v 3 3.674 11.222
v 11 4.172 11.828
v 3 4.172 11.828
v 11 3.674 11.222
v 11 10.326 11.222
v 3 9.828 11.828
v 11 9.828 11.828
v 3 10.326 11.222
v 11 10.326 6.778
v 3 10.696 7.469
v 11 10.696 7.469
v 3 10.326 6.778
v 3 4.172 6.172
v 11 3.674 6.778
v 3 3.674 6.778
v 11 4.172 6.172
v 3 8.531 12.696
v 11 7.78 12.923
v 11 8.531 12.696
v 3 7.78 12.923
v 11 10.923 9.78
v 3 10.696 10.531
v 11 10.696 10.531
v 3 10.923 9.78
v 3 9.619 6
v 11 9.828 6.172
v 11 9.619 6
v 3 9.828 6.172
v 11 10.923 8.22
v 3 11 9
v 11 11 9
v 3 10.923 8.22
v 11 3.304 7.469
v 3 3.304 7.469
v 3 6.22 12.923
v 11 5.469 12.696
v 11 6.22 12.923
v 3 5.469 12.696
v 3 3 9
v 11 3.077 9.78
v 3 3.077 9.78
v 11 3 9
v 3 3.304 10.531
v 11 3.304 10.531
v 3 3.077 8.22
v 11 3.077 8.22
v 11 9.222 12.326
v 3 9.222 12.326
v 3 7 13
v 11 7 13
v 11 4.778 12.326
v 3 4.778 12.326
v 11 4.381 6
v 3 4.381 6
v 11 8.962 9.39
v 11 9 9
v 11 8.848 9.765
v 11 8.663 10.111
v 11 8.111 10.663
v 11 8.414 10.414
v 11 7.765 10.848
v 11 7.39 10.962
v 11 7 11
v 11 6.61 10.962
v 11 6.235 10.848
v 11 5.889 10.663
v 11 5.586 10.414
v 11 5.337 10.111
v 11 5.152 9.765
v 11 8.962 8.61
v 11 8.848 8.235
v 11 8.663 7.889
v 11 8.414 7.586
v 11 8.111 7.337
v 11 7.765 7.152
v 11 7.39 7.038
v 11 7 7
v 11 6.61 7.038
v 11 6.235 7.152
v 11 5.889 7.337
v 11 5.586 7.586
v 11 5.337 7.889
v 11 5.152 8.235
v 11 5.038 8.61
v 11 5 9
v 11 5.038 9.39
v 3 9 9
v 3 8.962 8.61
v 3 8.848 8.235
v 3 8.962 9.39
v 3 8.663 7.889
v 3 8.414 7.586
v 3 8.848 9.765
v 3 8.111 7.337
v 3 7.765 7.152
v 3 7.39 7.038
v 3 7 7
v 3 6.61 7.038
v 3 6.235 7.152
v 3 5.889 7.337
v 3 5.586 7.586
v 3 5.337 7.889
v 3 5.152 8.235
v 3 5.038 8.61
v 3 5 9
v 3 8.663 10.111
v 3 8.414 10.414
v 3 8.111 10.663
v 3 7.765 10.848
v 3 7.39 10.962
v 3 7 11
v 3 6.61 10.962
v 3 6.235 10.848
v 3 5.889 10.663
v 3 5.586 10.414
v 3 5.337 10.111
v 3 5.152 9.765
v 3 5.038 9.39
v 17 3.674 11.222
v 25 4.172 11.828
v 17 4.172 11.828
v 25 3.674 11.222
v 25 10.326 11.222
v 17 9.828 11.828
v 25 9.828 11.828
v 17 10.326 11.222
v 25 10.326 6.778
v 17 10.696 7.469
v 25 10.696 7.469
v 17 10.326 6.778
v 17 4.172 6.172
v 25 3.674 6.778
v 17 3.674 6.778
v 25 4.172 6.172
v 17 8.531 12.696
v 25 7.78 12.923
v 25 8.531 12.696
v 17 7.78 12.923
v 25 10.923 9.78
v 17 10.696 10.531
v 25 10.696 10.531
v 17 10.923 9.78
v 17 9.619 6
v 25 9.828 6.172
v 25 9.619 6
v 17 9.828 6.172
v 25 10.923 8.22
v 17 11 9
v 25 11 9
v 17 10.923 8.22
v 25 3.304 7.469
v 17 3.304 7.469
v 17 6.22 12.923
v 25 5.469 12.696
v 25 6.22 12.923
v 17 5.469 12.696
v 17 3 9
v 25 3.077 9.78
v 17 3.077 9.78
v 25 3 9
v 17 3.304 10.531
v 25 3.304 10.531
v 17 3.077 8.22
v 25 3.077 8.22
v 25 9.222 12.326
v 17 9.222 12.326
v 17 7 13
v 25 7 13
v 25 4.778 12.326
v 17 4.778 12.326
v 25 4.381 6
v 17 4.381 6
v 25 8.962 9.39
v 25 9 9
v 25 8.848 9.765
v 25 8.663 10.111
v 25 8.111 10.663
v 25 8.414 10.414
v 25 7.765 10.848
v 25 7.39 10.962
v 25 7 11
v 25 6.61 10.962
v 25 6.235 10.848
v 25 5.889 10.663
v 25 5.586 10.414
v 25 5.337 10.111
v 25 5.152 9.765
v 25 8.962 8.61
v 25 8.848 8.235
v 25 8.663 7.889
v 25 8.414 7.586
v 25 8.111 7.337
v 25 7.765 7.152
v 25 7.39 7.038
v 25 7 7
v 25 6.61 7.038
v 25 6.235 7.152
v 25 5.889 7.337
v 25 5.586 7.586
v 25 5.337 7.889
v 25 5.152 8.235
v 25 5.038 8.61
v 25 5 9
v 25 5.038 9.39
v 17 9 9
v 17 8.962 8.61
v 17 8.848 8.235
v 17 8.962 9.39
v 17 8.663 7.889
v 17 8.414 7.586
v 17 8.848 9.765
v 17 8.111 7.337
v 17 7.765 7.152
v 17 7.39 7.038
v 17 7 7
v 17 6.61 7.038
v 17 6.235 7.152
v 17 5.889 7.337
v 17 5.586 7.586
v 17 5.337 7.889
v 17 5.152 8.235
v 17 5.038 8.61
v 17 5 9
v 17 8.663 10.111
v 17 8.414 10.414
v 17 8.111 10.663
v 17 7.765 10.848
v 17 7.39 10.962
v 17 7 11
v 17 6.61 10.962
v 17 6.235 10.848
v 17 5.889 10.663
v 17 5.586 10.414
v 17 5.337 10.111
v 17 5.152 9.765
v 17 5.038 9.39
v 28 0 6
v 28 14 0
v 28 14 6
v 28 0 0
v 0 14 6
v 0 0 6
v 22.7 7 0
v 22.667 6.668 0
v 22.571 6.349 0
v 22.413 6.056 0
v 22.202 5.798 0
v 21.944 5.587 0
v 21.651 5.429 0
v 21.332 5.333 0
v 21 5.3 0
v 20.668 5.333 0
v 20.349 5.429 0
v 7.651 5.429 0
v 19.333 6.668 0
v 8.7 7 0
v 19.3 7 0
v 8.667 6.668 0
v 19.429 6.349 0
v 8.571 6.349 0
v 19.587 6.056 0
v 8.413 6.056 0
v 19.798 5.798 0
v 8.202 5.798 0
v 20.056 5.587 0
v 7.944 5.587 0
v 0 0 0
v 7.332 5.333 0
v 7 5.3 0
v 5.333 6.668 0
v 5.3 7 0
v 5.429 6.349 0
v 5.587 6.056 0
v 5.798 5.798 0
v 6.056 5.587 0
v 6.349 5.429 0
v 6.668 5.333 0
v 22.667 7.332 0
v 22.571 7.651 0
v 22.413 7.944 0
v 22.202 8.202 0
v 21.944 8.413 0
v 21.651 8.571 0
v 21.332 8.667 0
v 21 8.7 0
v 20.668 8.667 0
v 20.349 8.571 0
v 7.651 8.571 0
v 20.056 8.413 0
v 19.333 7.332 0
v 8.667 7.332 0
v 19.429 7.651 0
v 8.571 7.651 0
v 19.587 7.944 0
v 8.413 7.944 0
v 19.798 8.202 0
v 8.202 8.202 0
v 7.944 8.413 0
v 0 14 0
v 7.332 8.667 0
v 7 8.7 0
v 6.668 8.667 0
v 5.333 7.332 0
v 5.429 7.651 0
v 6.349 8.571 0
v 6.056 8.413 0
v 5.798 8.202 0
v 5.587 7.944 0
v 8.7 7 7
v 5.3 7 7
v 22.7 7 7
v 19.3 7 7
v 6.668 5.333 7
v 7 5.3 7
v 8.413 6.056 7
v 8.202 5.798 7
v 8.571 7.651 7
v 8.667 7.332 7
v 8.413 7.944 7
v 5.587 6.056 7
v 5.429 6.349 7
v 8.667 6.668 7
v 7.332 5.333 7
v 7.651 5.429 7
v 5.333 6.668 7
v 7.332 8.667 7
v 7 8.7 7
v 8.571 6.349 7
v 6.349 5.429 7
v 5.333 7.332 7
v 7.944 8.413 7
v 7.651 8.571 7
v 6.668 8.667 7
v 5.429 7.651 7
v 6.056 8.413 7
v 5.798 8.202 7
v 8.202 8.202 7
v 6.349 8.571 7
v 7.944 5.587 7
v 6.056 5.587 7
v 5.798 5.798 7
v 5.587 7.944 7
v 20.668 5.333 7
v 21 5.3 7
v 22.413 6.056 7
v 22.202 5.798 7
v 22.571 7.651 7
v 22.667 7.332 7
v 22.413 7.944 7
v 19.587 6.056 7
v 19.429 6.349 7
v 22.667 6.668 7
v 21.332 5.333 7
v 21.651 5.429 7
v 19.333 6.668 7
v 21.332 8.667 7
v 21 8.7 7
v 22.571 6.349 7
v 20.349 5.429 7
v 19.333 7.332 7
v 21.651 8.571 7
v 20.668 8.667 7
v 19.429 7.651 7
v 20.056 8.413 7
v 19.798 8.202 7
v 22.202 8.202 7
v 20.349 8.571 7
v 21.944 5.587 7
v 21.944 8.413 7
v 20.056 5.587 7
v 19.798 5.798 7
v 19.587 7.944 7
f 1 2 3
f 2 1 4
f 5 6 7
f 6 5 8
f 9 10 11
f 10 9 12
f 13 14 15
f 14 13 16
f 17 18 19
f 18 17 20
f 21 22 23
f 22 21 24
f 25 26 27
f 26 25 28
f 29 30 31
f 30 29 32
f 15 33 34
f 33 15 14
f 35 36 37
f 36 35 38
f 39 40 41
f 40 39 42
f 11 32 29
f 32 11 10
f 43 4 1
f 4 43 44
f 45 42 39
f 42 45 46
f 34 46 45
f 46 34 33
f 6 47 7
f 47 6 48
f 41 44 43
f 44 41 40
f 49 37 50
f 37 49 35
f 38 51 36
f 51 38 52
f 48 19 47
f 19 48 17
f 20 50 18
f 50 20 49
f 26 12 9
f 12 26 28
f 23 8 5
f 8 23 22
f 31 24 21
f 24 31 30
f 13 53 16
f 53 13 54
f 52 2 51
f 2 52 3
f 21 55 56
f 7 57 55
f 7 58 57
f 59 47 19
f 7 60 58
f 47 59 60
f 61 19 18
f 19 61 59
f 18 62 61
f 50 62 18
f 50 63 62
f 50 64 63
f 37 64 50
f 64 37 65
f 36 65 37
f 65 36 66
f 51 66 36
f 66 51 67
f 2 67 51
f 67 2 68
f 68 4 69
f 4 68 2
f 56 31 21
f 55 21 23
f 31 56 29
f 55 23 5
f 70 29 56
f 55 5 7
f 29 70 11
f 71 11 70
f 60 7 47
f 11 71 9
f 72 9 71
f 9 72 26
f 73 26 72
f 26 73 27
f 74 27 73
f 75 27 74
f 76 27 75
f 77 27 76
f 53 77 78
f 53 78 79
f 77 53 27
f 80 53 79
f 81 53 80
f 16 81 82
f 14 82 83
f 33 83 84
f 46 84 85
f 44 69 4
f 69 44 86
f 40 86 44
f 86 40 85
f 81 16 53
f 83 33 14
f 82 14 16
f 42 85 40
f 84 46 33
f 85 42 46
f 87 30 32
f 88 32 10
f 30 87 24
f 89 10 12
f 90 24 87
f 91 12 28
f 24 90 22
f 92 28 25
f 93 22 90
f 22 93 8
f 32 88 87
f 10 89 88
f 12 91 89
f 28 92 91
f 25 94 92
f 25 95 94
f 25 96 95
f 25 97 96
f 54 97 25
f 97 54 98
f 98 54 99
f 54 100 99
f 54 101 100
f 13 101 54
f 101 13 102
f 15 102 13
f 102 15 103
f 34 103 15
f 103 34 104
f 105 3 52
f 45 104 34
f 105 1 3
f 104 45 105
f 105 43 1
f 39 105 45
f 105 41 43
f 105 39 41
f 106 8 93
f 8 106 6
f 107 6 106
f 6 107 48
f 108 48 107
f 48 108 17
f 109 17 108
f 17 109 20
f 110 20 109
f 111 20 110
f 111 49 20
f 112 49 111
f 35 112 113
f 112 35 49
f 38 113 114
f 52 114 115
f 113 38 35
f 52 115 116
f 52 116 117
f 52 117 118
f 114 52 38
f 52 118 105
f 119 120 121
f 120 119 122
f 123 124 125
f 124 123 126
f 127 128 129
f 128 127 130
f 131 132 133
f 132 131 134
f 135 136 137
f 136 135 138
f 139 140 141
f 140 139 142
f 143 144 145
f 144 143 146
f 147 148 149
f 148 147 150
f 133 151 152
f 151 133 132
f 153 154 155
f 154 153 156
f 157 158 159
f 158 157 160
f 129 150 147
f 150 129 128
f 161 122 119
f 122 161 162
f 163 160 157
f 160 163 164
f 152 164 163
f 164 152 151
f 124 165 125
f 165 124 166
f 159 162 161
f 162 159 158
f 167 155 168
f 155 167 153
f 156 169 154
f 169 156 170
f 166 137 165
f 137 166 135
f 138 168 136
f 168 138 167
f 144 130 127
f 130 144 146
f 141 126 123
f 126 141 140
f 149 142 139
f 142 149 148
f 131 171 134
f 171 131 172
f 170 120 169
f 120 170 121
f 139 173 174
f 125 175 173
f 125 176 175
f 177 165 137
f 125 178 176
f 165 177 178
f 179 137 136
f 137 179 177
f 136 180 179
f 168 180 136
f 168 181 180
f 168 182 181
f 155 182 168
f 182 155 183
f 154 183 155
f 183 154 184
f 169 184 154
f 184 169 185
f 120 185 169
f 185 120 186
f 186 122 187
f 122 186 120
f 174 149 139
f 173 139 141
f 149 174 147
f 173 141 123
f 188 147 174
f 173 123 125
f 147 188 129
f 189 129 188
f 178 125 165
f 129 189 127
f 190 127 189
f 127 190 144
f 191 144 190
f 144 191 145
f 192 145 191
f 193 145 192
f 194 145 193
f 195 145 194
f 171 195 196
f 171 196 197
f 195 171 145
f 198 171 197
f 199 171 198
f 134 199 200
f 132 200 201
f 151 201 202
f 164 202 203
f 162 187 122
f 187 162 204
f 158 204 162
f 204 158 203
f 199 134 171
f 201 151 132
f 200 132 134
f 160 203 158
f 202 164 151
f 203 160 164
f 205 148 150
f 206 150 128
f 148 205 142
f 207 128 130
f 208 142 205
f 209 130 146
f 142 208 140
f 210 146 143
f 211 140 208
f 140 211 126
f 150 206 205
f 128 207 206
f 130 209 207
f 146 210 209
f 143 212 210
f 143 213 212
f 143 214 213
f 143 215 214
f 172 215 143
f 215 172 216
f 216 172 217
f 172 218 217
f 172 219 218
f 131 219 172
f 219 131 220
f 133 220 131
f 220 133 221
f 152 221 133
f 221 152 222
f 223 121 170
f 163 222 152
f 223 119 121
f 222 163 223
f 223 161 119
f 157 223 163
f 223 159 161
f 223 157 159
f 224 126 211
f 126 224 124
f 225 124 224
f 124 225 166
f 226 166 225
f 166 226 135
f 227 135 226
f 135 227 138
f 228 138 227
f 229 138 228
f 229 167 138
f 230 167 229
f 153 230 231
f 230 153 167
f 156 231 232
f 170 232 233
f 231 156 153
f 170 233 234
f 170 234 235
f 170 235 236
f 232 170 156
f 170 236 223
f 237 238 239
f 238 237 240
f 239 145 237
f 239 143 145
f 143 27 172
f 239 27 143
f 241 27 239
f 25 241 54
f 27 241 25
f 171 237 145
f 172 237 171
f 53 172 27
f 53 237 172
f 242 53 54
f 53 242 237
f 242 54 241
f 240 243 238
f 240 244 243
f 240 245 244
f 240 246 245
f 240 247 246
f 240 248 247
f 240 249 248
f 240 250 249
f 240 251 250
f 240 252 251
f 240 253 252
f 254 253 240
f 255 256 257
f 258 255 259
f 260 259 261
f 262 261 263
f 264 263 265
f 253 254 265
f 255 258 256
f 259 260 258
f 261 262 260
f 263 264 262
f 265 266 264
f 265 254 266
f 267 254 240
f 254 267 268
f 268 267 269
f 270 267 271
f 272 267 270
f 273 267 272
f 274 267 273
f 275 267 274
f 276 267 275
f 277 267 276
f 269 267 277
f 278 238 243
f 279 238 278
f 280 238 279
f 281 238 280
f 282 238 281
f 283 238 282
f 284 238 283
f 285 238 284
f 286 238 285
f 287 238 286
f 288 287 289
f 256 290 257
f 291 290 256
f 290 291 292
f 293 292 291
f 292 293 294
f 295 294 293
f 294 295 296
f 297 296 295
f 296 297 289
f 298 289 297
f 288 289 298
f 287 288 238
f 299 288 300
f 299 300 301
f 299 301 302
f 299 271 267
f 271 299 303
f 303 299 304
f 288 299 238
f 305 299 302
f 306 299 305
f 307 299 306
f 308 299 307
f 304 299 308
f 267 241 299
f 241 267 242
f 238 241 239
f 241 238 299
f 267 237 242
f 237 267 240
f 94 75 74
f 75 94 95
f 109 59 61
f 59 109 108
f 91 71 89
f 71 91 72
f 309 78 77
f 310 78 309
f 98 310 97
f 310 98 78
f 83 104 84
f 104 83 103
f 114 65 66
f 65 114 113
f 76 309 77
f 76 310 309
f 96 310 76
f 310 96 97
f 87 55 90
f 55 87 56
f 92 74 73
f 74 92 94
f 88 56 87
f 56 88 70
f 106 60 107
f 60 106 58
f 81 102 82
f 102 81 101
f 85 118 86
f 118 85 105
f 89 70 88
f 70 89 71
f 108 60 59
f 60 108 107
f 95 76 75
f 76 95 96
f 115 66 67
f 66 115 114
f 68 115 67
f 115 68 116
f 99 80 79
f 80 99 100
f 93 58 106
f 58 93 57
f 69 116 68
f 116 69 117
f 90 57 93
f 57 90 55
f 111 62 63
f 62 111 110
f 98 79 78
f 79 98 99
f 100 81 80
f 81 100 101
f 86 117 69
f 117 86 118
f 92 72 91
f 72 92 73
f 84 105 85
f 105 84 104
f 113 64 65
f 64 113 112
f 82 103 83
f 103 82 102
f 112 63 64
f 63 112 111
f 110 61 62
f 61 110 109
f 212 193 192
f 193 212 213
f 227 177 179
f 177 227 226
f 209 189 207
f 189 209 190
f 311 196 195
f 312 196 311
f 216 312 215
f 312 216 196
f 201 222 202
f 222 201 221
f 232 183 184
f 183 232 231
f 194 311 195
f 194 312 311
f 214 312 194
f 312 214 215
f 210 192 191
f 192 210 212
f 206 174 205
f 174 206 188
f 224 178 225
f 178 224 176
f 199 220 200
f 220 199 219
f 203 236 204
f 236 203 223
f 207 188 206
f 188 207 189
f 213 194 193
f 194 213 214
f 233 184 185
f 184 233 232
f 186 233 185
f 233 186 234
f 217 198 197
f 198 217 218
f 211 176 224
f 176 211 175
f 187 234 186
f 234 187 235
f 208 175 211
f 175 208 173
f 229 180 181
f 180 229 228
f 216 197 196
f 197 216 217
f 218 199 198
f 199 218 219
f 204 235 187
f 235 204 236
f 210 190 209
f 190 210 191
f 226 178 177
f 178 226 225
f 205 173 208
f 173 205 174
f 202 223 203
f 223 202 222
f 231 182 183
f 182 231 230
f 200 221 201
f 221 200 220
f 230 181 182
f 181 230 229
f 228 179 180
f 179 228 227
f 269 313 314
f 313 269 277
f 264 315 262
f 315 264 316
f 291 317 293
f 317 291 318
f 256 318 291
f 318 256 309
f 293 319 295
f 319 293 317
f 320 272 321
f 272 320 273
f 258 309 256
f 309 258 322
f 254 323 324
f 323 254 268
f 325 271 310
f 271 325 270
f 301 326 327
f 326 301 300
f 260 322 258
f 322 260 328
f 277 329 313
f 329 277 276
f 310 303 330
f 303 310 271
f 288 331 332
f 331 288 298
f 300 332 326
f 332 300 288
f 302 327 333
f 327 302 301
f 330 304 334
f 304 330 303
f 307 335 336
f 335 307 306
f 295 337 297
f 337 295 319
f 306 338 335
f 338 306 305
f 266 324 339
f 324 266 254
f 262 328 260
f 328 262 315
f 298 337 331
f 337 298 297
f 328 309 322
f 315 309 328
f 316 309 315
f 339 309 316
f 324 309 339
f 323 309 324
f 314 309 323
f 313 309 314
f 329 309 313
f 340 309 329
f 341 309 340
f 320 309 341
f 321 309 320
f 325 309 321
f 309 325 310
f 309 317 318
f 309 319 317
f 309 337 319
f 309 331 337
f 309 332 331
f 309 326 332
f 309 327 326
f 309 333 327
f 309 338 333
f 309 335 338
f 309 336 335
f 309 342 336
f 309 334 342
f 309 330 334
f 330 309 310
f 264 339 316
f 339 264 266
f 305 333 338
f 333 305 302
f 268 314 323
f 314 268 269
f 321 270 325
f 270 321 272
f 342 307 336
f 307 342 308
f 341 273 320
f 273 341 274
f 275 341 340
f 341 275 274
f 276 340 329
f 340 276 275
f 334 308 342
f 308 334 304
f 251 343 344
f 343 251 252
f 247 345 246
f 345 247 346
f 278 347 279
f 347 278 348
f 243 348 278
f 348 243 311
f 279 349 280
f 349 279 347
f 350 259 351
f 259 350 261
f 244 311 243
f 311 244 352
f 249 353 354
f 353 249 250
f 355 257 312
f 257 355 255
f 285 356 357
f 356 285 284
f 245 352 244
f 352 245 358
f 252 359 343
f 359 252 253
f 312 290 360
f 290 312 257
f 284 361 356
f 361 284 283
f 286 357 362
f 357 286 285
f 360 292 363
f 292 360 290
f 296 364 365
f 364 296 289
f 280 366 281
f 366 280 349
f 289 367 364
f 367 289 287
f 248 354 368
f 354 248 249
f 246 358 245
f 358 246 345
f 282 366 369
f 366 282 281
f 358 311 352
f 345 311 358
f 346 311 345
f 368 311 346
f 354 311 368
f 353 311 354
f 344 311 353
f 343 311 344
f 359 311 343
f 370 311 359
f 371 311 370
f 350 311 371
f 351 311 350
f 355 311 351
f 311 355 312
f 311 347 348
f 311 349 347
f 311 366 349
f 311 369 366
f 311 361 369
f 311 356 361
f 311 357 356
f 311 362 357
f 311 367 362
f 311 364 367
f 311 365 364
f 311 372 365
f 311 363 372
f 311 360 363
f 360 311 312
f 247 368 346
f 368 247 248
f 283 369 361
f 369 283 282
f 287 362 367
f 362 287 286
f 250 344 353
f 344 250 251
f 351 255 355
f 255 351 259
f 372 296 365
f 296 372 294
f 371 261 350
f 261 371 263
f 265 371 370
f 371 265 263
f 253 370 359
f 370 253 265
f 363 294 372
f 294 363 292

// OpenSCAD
$fn = 32;

// ----------------------------------------------------------------------
// Cable clip: cable 4 mm, clamp 8 mm, base 28 mm
// ----------------------------------------------------------------------

// --- parameters (mm) ---
plate_x = 28;             // base length, X
plate_y = 14;             // base width, Y
plate_t = 6;              // base thickness
wire_seat_d = 8;          // clamp outside diameter
clip_t = 2;               // clamp wall
cable_d = 4;              // cable opening
ring_w = 8;               // clamp width along the cable
screw_d = 3.4;            // screw clearance
sink = 1;                 // overlap of the clamp into the base
pitch = 14;               // distance between the two clamps

module base() {
  cube([plate_x, plate_y, plate_t]);
}

module clamps() {
  for (sx = [-1, 1])
    translate([plate_x / 2 + sx * pitch / 2, plate_y / 2, plate_t + wire_seat_d / 2 - sink]) rotate([0, 90, 0])
      cylinder(h = ring_w, d = wire_seat_d, center = true);
}

difference() {
  union() {
    base();
    clamps();
  }
  for (sx = [-1, 1])
    translate([plate_x / 2 + sx * pitch / 2, plate_y / 2, plate_t + wire_seat_d / 2 - sink]) rotate([0, 90, 0]) translate([0, 0, -ring_w / 2 - 1]) cylinder(h = ring_w + 2, d = cable_d);
  translate([7, plate_y / 2, -1]) cylinder(h = plate_t + 2, d = screw_d);
  translate([21, plate_y / 2, -1]) cylinder(h = plate_t + 2, d = screw_d);
}
